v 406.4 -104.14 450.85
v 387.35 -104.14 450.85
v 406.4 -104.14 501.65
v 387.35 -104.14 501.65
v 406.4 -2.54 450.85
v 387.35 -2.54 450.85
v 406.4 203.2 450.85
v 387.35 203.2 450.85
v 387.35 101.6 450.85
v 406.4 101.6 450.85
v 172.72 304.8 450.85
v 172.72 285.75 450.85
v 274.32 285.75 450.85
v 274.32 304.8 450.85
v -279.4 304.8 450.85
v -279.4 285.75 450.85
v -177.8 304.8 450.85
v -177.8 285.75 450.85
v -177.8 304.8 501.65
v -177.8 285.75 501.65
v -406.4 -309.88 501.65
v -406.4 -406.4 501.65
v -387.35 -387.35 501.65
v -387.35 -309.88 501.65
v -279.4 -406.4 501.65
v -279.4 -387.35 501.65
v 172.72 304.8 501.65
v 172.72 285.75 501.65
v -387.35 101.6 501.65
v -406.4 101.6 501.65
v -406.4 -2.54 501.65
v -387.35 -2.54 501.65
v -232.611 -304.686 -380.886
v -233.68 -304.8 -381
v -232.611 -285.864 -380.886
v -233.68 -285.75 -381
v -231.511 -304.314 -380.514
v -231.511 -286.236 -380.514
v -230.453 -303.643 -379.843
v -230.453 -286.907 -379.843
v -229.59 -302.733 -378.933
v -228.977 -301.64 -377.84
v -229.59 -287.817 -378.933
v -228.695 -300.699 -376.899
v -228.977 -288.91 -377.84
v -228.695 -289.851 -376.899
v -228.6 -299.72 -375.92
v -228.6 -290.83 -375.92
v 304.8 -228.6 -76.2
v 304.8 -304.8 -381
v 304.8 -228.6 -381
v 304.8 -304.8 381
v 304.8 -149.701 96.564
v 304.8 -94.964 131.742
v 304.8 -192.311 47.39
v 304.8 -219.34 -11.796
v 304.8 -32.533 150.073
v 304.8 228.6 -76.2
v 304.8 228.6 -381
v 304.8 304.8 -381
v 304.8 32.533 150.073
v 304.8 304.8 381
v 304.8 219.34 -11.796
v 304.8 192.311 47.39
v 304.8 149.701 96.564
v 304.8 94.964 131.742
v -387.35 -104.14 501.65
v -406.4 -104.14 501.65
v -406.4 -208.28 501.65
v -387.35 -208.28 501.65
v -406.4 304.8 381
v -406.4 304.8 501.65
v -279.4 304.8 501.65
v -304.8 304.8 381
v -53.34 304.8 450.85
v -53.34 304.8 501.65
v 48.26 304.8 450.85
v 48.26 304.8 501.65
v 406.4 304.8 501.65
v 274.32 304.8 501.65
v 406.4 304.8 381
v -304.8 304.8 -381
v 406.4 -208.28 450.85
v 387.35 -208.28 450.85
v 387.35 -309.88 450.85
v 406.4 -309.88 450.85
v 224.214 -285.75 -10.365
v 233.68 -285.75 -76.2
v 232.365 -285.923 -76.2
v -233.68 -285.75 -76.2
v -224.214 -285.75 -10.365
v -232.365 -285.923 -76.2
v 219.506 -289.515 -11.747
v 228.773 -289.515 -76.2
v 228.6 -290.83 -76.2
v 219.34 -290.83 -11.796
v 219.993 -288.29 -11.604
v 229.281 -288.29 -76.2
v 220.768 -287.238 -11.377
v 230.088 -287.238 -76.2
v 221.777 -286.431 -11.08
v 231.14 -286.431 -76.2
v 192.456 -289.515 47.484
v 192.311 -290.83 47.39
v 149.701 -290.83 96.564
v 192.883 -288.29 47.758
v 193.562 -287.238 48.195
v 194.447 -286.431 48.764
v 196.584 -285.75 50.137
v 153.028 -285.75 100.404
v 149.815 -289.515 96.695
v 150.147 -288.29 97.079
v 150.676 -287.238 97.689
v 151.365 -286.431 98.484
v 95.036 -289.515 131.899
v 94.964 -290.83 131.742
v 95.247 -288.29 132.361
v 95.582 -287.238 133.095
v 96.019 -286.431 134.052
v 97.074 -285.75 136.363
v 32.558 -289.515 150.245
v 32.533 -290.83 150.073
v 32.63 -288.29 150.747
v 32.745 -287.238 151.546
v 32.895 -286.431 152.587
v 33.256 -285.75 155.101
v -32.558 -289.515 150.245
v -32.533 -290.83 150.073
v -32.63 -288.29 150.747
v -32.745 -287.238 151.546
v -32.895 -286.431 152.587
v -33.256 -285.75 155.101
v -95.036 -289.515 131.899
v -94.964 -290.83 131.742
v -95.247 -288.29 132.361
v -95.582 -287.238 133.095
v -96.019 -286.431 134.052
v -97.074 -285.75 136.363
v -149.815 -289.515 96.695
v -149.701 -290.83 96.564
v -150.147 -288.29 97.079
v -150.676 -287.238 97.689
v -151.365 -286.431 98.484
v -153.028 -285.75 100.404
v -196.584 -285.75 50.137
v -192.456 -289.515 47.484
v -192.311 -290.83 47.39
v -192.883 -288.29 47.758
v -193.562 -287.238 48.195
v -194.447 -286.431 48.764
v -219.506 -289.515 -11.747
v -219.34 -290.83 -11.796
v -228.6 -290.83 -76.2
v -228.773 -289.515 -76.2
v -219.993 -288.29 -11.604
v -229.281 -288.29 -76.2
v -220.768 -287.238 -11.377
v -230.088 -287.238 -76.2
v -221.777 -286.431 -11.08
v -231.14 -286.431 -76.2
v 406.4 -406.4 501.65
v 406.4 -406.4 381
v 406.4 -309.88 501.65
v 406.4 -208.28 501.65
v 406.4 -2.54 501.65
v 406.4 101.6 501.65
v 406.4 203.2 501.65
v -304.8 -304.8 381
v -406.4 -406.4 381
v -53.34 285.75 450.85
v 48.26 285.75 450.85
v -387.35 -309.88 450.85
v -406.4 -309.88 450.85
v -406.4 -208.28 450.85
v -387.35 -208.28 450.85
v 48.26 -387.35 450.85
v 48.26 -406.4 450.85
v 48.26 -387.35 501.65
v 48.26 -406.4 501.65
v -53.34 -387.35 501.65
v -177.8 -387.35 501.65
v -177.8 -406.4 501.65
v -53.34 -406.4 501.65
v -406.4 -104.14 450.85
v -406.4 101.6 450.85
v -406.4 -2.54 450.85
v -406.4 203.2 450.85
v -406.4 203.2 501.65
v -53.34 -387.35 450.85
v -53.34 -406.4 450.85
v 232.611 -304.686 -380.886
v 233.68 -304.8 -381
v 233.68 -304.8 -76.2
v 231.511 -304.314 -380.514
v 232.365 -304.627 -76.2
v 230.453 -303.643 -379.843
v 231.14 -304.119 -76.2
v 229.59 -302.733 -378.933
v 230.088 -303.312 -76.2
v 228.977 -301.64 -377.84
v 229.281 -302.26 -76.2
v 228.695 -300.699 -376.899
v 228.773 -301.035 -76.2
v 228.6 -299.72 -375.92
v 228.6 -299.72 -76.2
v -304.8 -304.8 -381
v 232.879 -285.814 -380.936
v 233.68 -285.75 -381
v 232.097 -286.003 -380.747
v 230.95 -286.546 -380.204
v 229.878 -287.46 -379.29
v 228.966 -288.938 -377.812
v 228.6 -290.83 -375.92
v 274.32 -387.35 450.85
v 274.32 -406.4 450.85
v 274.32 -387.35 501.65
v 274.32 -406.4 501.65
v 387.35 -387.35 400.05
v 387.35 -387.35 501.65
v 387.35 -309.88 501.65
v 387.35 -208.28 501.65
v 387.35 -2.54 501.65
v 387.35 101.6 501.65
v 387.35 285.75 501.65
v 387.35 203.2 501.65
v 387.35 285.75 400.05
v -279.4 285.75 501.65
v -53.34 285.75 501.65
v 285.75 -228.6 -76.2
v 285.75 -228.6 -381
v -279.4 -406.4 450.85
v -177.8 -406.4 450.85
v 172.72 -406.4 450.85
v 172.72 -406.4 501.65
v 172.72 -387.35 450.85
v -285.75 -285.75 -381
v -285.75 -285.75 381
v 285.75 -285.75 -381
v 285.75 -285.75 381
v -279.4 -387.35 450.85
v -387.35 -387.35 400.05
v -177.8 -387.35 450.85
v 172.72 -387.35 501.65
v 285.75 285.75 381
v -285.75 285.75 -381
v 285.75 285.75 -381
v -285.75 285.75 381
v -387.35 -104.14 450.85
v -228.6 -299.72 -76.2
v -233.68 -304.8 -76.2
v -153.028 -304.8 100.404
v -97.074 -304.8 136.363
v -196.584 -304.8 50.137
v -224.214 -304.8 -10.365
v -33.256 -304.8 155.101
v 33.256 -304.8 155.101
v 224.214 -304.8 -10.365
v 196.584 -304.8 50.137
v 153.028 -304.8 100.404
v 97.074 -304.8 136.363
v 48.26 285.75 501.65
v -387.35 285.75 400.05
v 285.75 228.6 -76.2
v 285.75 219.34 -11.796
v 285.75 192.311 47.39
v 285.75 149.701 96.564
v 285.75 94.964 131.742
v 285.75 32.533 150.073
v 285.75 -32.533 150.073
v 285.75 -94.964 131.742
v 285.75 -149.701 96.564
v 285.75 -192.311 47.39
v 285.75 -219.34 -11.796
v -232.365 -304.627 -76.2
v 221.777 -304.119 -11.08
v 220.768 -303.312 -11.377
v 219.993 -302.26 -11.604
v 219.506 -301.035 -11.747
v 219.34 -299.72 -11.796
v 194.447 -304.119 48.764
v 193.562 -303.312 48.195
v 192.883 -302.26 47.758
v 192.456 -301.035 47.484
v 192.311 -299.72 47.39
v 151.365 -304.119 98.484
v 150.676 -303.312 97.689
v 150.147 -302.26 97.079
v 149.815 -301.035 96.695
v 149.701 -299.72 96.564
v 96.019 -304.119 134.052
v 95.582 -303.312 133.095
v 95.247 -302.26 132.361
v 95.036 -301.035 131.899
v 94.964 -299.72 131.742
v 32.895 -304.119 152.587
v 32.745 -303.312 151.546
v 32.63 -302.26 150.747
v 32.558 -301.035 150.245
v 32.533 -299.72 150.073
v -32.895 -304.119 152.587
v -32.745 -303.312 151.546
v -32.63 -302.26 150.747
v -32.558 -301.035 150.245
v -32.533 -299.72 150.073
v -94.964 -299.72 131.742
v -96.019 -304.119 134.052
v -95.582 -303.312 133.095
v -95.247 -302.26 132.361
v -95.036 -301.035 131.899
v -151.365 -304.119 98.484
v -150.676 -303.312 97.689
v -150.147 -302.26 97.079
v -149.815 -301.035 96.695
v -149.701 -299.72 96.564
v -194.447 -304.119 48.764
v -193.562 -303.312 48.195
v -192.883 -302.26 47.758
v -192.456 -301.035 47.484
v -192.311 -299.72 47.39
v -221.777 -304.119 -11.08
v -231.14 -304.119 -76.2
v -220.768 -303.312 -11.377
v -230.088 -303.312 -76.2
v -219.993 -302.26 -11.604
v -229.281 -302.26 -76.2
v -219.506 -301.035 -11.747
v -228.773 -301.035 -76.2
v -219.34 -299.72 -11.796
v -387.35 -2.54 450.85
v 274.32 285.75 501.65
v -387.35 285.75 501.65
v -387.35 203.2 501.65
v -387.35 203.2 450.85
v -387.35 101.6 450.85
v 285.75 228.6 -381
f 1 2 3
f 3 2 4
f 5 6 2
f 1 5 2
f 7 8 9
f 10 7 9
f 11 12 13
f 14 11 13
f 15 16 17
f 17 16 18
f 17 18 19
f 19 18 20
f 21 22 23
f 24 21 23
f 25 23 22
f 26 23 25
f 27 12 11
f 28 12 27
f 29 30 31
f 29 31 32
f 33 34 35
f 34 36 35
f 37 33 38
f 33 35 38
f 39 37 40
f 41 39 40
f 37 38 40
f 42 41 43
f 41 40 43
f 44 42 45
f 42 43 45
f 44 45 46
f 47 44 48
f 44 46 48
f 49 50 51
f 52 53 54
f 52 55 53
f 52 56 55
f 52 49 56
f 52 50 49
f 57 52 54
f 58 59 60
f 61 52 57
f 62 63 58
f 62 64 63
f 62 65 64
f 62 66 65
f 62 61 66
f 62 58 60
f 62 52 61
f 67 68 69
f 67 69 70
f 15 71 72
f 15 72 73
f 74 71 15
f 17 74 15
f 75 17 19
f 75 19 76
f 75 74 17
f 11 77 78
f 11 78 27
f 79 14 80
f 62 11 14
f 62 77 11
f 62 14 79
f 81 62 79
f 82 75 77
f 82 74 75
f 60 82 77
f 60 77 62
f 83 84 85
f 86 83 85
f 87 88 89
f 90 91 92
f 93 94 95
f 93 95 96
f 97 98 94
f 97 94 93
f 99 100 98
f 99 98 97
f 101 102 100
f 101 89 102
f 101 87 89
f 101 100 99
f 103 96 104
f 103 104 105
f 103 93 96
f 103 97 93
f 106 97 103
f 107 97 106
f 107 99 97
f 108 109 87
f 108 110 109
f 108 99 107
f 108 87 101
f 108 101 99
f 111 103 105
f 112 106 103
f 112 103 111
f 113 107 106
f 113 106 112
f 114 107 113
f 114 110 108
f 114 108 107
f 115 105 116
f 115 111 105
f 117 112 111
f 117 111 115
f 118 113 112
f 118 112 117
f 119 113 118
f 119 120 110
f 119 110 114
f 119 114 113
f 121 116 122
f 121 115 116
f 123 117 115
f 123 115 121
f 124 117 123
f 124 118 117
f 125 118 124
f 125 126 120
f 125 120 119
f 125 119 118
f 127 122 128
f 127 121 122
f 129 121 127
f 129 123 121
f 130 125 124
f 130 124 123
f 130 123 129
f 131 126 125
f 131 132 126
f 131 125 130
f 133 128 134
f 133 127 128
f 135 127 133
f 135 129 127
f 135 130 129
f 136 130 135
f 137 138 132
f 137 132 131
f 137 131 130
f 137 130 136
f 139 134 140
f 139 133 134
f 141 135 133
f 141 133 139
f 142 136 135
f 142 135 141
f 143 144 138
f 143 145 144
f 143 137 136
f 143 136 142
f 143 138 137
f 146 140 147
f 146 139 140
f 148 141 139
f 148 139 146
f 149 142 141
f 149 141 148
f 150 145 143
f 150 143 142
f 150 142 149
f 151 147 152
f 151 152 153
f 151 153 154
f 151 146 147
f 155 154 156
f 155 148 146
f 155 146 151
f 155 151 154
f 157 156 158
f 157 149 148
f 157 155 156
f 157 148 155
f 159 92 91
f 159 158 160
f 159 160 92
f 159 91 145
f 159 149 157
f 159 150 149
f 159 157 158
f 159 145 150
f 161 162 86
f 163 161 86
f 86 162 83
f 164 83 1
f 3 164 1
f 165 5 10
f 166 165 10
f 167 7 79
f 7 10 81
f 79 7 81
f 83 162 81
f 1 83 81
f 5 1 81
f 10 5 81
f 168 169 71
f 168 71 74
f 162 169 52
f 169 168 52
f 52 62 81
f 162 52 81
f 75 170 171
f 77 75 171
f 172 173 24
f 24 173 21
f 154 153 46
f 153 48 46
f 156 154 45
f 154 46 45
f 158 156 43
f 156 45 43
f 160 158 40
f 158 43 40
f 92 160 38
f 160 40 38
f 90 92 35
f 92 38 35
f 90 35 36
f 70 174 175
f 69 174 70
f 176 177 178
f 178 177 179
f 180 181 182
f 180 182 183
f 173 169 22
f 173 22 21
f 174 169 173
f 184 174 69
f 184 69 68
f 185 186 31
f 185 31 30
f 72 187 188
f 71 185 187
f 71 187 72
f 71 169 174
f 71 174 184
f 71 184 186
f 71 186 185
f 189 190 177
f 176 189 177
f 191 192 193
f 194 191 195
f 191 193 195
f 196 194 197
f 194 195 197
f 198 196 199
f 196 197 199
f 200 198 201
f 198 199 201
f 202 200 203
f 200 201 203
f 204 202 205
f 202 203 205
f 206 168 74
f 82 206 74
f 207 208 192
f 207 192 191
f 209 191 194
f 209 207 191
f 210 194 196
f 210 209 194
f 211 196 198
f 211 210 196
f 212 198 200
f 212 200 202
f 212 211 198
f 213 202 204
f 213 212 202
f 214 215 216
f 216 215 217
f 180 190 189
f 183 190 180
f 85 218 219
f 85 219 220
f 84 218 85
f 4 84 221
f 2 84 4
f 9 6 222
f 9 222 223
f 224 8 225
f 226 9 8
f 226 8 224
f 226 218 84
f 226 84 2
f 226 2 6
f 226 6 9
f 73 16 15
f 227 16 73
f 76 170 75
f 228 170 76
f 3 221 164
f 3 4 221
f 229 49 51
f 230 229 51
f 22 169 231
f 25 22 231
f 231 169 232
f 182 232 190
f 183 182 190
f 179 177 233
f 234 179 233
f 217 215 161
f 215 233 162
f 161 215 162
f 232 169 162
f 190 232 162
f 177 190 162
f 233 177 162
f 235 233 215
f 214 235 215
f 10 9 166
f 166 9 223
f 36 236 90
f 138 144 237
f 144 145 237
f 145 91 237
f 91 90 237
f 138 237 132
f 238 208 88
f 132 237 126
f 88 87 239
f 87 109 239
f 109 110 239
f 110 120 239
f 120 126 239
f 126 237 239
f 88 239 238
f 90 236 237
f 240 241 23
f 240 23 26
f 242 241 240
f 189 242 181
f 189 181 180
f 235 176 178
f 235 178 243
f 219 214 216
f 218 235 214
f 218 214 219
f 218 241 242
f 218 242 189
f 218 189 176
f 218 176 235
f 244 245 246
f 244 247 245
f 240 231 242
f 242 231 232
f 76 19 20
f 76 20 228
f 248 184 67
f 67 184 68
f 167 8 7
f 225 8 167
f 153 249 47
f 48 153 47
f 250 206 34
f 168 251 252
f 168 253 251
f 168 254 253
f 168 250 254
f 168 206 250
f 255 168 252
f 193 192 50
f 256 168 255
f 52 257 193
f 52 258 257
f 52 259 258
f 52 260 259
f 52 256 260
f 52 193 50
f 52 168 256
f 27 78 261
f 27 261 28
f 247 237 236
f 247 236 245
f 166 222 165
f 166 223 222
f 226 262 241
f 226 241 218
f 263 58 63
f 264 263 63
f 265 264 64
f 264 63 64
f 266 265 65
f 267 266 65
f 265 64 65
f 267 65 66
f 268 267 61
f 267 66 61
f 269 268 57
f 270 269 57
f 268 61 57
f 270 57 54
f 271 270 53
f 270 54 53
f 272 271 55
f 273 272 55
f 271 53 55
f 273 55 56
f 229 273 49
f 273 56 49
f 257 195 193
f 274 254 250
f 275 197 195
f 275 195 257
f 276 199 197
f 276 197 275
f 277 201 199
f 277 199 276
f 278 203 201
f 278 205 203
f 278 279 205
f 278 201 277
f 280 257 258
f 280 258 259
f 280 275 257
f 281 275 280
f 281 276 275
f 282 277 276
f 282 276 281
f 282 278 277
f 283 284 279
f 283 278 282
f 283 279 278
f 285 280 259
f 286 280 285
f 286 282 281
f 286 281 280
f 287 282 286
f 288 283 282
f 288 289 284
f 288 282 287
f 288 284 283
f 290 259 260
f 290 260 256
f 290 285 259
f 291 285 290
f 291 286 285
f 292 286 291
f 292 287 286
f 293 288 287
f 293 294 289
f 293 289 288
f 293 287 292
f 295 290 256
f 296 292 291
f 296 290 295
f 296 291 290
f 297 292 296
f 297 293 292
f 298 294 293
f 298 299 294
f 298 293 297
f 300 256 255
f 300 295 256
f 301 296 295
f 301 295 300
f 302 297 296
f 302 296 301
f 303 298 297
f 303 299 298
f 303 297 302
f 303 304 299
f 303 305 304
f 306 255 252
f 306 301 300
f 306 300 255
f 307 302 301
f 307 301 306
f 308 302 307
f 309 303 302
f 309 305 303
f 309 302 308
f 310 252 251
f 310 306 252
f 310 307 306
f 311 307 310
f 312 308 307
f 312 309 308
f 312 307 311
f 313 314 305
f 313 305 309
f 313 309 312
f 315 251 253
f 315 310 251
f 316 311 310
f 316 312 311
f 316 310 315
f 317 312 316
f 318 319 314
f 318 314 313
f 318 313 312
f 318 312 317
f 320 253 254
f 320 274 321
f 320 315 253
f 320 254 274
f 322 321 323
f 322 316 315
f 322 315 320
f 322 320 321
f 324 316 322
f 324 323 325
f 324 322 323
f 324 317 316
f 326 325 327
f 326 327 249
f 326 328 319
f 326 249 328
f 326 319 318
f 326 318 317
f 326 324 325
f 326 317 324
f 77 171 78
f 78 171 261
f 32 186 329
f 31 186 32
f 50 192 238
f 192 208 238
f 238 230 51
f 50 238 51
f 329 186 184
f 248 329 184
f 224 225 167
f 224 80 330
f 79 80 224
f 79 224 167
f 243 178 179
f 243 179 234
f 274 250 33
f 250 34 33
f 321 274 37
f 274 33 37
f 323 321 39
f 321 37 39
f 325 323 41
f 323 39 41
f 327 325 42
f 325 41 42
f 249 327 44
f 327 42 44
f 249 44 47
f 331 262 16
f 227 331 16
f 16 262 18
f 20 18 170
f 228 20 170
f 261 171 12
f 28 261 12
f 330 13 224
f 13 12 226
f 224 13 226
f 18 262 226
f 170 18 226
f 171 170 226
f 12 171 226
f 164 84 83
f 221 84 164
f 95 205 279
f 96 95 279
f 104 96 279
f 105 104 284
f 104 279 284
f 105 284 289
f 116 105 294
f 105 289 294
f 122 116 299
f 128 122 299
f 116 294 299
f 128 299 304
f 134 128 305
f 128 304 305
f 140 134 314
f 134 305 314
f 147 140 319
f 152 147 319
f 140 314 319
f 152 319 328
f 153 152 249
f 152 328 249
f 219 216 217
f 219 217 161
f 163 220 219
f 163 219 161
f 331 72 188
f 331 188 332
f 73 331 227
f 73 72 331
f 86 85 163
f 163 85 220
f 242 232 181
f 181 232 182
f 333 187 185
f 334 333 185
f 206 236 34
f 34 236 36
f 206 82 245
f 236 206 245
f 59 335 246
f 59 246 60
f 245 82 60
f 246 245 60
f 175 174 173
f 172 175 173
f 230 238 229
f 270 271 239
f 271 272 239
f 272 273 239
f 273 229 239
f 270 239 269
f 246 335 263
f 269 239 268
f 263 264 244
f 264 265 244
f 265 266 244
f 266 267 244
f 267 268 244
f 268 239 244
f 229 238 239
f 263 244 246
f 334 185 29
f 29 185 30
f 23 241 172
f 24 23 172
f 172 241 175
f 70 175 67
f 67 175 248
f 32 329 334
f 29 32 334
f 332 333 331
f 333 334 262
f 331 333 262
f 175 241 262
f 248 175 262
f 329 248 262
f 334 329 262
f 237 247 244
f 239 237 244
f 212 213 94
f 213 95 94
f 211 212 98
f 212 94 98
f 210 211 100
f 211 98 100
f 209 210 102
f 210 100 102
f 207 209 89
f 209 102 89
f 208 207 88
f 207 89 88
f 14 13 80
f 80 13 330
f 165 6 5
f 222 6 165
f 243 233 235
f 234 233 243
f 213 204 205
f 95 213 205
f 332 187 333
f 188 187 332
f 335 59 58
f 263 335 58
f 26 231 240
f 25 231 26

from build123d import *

# Parameters (mm, degrees)
F0_W      = 609.6
F0_H      = 609.6
F0_W_2    = 571.5
F0_H_2    = 571.5
F1_DEPTH  = 381
F3_DEPTH  = 25.4
F5_DEPTH  = 25.4
F6_R      = 5.08
F7_W      = 812.8
F7_H      = 711.2
F8_DEPTH  = 19.05
F9_W      = 812.8
F9_H      = 711.2
F9_W_2    = 774.7
F9_H_2    = 673.1
F10_DEPTH = 101.6
F11_W     = 101.6
F11_H     = 50.8
F12_DEPTH = 711.201
F13_W     = 101.6
F13_H     = 50.8
F14_DEPTH = 812.801


with BuildPart() as f1:
    # F0 (on Top) → F1 (new body, symmetric)
    with BuildSketch(Plane.XY):
        Rectangle(F0_W, F0_H)
        Rectangle(F0_W_2, F0_H_2, mode=Mode.SUBTRACT)
    extrude(amount=F1_DEPTH, both=True)

    # F2 (on face) → F3 (cut)
    with BuildSketch(Plane.XZ.offset(304.8)):
        with BuildLine():
            Line((-228.6, -76.2), (-228.6, -381))
            Line((-228.6, -381), (228.6, -381))
            Line((228.6, -381), (228.6, -76.2))
            ThreePointArc((228.6, -76.2), (0, 152.4), (-228.6, -76.2))
        make_face()
    extrude(amount=-F3_DEPTH, mode=Mode.SUBTRACT)

    # F4 (on face) → F5 (cut)
    with BuildSketch(Plane.YZ.offset(304.8)):
        with BuildLine():
            Line((-228.6, -76.2), (-228.6, -381))
            Line((-228.6, -381), (228.6, -381))
            Line((228.6, -381), (228.6, -76.2))
            ThreePointArc((228.6, -76.2), (0, 152.4), (-228.6, -76.2))
        make_face()
    extrude(amount=-F5_DEPTH, mode=Mode.SUBTRACT)

    # F6
    f6_edges = [f1.edges().sort_by_distance(p)[0] for p in [
        (-228.6, -304.8, -228.6),
        (-228.6, -295.275, -381),
        (-228.6, -285.75, -228.6),
        (-228.6, -295.275, -76.2),
        (0, -304.8, 152.4),
        (0, -285.75, 152.4),
        (228.6, -295.275, -76.2),
        (228.6, -304.8, -228.6),
        (228.6, -285.75, -228.6),
        (228.6, -295.275, -381),
    ]]
    fillet(f6_edges, radius=F6_R)

    # F7 (on face) → F8 (join)
    with BuildSketch(Plane.XY.offset(381)):
        with Locations((0, -50.8)):
            Rectangle(F7_W, F7_H)
    extrude(amount=F8_DEPTH)

    # F9 (on face) → F10 (join)
    with BuildSketch(Plane.XY.offset(400.05)):
        with Locations((0, -50.8)):
            Rectangle(F9_W, F9_H)
        with Locations((0, -50.8)):
            Rectangle(F9_W_2, F9_H_2, mode=Mode.SUBTRACT)
    extrude(amount=F10_DEPTH)

    # F11 (on face) → F12 (cut, through all)
    with BuildSketch(Plane.XZ.offset(406.4)):
        with Locations((-228.6, 476.25)):
            Rectangle(F11_W, F11_H)
        with Locations((-2.54, 476.25)):
            Rectangle(F11_W, F11_H)
        with Locations((223.52, 476.25)):
            Rectangle(F11_W, F11_H)
    extrude(amount=-F12_DEPTH, mode=Mode.SUBTRACT)

    # F13 (on face) → F14 (cut, through all)
    with BuildSketch(Plane(origin=(-406.4, 0, 0), x_dir=(0, -1, 0), z_dir=(-1, 0, 0))):
        with Locations((-152.4, 476.25)):
            Rectangle(F13_W, F13_H)
        with Locations((53.34, 476.25)):
            Rectangle(F13_W, F13_H)
        with Locations((259.08, 476.25)):
            Rectangle(F13_W, F13_H)
    extrude(amount=-F14_DEPTH, mode=Mode.SUBTRACT)


solid = f1.part
